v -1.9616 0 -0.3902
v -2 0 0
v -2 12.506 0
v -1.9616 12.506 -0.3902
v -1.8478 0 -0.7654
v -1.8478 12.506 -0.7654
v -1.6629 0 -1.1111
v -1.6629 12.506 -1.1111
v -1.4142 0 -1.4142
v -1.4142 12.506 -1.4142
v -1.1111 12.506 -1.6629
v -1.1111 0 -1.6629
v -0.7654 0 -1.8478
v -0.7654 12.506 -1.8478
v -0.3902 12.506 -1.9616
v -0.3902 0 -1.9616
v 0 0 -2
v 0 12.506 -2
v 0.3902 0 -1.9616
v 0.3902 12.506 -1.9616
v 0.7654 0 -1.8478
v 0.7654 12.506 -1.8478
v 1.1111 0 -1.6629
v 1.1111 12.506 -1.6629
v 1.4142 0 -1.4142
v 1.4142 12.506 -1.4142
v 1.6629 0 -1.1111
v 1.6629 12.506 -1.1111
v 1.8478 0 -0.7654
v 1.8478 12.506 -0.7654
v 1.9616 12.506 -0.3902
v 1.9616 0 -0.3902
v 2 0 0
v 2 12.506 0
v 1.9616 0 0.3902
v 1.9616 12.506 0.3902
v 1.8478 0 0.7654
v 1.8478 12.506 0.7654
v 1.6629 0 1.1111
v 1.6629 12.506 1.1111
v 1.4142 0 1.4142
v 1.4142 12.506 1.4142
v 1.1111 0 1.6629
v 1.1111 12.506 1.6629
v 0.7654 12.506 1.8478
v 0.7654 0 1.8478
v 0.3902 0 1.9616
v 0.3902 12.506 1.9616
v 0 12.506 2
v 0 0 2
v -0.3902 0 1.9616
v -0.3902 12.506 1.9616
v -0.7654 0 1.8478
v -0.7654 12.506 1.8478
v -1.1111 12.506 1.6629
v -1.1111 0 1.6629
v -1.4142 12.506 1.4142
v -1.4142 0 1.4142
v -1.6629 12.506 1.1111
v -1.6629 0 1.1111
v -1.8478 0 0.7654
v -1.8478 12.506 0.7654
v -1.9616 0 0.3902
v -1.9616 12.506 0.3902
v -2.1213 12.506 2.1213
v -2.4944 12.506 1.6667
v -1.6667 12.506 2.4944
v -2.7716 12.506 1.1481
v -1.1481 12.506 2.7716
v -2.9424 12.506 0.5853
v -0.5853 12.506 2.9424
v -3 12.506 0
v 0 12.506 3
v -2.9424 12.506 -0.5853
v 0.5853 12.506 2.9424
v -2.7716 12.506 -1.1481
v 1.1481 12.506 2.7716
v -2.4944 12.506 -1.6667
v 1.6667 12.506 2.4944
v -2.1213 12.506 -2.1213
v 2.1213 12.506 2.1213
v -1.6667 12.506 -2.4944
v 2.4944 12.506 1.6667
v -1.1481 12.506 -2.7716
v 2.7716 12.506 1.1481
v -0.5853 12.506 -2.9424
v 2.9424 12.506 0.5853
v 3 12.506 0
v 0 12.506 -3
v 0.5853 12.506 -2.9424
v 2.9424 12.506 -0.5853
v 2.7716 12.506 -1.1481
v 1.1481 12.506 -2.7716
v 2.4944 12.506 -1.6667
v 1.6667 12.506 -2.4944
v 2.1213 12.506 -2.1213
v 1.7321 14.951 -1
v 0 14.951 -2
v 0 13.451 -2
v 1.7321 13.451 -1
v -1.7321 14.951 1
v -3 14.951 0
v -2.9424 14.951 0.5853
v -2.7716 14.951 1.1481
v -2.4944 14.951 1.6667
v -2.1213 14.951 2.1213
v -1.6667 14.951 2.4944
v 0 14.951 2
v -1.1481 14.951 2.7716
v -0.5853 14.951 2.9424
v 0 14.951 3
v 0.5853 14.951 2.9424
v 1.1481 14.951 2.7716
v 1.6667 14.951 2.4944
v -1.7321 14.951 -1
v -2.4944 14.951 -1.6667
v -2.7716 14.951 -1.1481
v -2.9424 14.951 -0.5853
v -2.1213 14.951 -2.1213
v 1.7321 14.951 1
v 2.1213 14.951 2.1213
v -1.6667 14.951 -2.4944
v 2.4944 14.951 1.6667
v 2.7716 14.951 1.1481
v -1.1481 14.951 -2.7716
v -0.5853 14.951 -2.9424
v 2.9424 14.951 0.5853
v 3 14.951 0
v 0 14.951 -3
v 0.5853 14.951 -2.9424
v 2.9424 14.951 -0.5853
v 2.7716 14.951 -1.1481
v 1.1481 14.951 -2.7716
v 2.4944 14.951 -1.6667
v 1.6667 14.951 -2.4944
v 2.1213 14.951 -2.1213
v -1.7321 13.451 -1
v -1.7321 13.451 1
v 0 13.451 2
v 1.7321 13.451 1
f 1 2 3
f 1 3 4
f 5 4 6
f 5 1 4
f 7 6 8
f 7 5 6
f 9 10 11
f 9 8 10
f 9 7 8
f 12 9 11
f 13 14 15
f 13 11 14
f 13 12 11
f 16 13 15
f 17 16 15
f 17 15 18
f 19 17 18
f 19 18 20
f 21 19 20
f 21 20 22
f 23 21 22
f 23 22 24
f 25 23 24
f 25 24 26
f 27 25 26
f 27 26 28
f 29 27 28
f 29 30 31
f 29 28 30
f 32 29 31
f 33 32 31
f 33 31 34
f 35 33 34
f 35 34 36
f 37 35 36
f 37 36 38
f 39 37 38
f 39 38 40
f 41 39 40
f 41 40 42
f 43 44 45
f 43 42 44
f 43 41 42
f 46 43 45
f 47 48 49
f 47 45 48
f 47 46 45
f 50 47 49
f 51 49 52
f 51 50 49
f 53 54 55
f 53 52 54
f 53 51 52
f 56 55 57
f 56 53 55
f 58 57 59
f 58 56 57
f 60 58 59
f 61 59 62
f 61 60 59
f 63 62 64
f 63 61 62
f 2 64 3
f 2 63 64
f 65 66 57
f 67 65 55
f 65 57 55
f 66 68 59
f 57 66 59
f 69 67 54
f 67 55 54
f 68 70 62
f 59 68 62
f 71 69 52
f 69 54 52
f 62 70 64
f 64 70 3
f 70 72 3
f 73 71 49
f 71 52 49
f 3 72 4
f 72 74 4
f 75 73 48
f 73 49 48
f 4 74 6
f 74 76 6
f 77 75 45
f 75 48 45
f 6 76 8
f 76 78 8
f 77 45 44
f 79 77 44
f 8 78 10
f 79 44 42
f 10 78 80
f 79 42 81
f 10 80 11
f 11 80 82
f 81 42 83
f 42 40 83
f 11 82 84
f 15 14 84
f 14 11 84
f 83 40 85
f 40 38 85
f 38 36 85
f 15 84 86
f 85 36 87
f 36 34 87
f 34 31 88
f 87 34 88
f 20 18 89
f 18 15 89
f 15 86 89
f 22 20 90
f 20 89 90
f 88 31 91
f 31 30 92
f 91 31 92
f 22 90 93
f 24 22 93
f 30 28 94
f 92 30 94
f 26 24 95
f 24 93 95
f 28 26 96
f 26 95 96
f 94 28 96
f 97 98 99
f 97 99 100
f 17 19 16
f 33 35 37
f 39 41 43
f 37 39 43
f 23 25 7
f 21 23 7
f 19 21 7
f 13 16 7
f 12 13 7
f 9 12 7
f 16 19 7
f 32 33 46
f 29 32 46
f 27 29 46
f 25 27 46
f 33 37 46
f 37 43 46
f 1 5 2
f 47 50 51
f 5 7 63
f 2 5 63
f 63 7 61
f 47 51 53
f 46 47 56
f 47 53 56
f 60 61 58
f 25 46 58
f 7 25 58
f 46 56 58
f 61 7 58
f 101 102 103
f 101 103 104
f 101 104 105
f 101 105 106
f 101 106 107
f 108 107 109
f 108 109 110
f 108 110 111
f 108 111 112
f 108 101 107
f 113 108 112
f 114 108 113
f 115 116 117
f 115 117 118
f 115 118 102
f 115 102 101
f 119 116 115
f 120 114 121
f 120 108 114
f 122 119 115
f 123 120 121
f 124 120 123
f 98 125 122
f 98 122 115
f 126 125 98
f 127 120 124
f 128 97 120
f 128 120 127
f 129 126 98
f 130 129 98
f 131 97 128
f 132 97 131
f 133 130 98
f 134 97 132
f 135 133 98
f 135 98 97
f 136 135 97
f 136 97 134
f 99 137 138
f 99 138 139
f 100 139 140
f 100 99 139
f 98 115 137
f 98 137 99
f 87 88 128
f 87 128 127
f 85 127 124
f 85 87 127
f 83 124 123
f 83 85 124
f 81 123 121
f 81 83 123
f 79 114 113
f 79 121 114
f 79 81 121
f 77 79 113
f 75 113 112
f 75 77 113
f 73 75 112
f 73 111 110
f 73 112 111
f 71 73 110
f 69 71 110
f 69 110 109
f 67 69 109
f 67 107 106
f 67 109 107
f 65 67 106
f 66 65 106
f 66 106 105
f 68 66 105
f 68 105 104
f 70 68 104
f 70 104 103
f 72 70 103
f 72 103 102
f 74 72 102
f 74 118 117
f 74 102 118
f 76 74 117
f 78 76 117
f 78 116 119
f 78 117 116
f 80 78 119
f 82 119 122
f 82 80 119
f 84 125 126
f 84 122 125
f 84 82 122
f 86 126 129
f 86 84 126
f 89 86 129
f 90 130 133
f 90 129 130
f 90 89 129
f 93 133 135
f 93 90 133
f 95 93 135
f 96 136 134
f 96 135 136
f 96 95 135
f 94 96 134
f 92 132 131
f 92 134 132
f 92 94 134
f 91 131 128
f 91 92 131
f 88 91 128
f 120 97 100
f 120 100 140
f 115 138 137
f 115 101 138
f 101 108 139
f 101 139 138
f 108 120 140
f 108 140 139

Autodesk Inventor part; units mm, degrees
ref_plane "YZ Plane" through (0, 0, 0) normal (1, 0, 0) x (0, 1, 0)
ref_plane "XZ Plane" through (0, 0, 0) normal (0, 1, 0) x (-1, 0, 0)
ref_plane "XY Plane" through (0, 0, 0) normal (0, 0, 1) x (1, 0, 0)
sketch "Sketch1" plane through (0, 0, 0) normal (0, 1, 0) x (-1, 0, 0)
  circle A0 centre (0, 0) radius 2
  dimension "d0" = 4
extrude "Extrusion1" add sketch "Sketch1" along normal blind 12.506
sketch "Sketch2" plane through (0, 12.506, 0) normal (0, 1, 0) x (1, 0, 0)
  circle A0 centre (0, 0) radius 3
  dimension "d3" = 6
extrude "Extrusion2" add sketch "Sketch2" along normal blind 2.445
sketch "Sketch3" plane through (0, 14.951, 0) normal (0, 1, 0) x (1, 0, 0)
  circle A0 centre (0, 0) radius 2 projected
  line L0 (0, 2) -> (1.7321, 1)
  line L1 (1.7321, 1) -> (1.7321, -1)
  line L2 (1.7321, -1) -> (0, -2)
  line L3 (0, -2) -> (-1.7321, -1)
  line L4 (-1.7321, -1) -> (-1.7321, 1)
  line L5 (-1.7321, 1) -> (0, 2)
extrude "Extrusion3" cut sketch "Sketch3" against normal blind 1.5 contours L1 L2 L3 L4 L5 L0
thread "Thread1" size "M4x0.5" class "6g" standard "ANSI Metric M Profile" length 20
properties part number "4mm_0.5_Screw"
